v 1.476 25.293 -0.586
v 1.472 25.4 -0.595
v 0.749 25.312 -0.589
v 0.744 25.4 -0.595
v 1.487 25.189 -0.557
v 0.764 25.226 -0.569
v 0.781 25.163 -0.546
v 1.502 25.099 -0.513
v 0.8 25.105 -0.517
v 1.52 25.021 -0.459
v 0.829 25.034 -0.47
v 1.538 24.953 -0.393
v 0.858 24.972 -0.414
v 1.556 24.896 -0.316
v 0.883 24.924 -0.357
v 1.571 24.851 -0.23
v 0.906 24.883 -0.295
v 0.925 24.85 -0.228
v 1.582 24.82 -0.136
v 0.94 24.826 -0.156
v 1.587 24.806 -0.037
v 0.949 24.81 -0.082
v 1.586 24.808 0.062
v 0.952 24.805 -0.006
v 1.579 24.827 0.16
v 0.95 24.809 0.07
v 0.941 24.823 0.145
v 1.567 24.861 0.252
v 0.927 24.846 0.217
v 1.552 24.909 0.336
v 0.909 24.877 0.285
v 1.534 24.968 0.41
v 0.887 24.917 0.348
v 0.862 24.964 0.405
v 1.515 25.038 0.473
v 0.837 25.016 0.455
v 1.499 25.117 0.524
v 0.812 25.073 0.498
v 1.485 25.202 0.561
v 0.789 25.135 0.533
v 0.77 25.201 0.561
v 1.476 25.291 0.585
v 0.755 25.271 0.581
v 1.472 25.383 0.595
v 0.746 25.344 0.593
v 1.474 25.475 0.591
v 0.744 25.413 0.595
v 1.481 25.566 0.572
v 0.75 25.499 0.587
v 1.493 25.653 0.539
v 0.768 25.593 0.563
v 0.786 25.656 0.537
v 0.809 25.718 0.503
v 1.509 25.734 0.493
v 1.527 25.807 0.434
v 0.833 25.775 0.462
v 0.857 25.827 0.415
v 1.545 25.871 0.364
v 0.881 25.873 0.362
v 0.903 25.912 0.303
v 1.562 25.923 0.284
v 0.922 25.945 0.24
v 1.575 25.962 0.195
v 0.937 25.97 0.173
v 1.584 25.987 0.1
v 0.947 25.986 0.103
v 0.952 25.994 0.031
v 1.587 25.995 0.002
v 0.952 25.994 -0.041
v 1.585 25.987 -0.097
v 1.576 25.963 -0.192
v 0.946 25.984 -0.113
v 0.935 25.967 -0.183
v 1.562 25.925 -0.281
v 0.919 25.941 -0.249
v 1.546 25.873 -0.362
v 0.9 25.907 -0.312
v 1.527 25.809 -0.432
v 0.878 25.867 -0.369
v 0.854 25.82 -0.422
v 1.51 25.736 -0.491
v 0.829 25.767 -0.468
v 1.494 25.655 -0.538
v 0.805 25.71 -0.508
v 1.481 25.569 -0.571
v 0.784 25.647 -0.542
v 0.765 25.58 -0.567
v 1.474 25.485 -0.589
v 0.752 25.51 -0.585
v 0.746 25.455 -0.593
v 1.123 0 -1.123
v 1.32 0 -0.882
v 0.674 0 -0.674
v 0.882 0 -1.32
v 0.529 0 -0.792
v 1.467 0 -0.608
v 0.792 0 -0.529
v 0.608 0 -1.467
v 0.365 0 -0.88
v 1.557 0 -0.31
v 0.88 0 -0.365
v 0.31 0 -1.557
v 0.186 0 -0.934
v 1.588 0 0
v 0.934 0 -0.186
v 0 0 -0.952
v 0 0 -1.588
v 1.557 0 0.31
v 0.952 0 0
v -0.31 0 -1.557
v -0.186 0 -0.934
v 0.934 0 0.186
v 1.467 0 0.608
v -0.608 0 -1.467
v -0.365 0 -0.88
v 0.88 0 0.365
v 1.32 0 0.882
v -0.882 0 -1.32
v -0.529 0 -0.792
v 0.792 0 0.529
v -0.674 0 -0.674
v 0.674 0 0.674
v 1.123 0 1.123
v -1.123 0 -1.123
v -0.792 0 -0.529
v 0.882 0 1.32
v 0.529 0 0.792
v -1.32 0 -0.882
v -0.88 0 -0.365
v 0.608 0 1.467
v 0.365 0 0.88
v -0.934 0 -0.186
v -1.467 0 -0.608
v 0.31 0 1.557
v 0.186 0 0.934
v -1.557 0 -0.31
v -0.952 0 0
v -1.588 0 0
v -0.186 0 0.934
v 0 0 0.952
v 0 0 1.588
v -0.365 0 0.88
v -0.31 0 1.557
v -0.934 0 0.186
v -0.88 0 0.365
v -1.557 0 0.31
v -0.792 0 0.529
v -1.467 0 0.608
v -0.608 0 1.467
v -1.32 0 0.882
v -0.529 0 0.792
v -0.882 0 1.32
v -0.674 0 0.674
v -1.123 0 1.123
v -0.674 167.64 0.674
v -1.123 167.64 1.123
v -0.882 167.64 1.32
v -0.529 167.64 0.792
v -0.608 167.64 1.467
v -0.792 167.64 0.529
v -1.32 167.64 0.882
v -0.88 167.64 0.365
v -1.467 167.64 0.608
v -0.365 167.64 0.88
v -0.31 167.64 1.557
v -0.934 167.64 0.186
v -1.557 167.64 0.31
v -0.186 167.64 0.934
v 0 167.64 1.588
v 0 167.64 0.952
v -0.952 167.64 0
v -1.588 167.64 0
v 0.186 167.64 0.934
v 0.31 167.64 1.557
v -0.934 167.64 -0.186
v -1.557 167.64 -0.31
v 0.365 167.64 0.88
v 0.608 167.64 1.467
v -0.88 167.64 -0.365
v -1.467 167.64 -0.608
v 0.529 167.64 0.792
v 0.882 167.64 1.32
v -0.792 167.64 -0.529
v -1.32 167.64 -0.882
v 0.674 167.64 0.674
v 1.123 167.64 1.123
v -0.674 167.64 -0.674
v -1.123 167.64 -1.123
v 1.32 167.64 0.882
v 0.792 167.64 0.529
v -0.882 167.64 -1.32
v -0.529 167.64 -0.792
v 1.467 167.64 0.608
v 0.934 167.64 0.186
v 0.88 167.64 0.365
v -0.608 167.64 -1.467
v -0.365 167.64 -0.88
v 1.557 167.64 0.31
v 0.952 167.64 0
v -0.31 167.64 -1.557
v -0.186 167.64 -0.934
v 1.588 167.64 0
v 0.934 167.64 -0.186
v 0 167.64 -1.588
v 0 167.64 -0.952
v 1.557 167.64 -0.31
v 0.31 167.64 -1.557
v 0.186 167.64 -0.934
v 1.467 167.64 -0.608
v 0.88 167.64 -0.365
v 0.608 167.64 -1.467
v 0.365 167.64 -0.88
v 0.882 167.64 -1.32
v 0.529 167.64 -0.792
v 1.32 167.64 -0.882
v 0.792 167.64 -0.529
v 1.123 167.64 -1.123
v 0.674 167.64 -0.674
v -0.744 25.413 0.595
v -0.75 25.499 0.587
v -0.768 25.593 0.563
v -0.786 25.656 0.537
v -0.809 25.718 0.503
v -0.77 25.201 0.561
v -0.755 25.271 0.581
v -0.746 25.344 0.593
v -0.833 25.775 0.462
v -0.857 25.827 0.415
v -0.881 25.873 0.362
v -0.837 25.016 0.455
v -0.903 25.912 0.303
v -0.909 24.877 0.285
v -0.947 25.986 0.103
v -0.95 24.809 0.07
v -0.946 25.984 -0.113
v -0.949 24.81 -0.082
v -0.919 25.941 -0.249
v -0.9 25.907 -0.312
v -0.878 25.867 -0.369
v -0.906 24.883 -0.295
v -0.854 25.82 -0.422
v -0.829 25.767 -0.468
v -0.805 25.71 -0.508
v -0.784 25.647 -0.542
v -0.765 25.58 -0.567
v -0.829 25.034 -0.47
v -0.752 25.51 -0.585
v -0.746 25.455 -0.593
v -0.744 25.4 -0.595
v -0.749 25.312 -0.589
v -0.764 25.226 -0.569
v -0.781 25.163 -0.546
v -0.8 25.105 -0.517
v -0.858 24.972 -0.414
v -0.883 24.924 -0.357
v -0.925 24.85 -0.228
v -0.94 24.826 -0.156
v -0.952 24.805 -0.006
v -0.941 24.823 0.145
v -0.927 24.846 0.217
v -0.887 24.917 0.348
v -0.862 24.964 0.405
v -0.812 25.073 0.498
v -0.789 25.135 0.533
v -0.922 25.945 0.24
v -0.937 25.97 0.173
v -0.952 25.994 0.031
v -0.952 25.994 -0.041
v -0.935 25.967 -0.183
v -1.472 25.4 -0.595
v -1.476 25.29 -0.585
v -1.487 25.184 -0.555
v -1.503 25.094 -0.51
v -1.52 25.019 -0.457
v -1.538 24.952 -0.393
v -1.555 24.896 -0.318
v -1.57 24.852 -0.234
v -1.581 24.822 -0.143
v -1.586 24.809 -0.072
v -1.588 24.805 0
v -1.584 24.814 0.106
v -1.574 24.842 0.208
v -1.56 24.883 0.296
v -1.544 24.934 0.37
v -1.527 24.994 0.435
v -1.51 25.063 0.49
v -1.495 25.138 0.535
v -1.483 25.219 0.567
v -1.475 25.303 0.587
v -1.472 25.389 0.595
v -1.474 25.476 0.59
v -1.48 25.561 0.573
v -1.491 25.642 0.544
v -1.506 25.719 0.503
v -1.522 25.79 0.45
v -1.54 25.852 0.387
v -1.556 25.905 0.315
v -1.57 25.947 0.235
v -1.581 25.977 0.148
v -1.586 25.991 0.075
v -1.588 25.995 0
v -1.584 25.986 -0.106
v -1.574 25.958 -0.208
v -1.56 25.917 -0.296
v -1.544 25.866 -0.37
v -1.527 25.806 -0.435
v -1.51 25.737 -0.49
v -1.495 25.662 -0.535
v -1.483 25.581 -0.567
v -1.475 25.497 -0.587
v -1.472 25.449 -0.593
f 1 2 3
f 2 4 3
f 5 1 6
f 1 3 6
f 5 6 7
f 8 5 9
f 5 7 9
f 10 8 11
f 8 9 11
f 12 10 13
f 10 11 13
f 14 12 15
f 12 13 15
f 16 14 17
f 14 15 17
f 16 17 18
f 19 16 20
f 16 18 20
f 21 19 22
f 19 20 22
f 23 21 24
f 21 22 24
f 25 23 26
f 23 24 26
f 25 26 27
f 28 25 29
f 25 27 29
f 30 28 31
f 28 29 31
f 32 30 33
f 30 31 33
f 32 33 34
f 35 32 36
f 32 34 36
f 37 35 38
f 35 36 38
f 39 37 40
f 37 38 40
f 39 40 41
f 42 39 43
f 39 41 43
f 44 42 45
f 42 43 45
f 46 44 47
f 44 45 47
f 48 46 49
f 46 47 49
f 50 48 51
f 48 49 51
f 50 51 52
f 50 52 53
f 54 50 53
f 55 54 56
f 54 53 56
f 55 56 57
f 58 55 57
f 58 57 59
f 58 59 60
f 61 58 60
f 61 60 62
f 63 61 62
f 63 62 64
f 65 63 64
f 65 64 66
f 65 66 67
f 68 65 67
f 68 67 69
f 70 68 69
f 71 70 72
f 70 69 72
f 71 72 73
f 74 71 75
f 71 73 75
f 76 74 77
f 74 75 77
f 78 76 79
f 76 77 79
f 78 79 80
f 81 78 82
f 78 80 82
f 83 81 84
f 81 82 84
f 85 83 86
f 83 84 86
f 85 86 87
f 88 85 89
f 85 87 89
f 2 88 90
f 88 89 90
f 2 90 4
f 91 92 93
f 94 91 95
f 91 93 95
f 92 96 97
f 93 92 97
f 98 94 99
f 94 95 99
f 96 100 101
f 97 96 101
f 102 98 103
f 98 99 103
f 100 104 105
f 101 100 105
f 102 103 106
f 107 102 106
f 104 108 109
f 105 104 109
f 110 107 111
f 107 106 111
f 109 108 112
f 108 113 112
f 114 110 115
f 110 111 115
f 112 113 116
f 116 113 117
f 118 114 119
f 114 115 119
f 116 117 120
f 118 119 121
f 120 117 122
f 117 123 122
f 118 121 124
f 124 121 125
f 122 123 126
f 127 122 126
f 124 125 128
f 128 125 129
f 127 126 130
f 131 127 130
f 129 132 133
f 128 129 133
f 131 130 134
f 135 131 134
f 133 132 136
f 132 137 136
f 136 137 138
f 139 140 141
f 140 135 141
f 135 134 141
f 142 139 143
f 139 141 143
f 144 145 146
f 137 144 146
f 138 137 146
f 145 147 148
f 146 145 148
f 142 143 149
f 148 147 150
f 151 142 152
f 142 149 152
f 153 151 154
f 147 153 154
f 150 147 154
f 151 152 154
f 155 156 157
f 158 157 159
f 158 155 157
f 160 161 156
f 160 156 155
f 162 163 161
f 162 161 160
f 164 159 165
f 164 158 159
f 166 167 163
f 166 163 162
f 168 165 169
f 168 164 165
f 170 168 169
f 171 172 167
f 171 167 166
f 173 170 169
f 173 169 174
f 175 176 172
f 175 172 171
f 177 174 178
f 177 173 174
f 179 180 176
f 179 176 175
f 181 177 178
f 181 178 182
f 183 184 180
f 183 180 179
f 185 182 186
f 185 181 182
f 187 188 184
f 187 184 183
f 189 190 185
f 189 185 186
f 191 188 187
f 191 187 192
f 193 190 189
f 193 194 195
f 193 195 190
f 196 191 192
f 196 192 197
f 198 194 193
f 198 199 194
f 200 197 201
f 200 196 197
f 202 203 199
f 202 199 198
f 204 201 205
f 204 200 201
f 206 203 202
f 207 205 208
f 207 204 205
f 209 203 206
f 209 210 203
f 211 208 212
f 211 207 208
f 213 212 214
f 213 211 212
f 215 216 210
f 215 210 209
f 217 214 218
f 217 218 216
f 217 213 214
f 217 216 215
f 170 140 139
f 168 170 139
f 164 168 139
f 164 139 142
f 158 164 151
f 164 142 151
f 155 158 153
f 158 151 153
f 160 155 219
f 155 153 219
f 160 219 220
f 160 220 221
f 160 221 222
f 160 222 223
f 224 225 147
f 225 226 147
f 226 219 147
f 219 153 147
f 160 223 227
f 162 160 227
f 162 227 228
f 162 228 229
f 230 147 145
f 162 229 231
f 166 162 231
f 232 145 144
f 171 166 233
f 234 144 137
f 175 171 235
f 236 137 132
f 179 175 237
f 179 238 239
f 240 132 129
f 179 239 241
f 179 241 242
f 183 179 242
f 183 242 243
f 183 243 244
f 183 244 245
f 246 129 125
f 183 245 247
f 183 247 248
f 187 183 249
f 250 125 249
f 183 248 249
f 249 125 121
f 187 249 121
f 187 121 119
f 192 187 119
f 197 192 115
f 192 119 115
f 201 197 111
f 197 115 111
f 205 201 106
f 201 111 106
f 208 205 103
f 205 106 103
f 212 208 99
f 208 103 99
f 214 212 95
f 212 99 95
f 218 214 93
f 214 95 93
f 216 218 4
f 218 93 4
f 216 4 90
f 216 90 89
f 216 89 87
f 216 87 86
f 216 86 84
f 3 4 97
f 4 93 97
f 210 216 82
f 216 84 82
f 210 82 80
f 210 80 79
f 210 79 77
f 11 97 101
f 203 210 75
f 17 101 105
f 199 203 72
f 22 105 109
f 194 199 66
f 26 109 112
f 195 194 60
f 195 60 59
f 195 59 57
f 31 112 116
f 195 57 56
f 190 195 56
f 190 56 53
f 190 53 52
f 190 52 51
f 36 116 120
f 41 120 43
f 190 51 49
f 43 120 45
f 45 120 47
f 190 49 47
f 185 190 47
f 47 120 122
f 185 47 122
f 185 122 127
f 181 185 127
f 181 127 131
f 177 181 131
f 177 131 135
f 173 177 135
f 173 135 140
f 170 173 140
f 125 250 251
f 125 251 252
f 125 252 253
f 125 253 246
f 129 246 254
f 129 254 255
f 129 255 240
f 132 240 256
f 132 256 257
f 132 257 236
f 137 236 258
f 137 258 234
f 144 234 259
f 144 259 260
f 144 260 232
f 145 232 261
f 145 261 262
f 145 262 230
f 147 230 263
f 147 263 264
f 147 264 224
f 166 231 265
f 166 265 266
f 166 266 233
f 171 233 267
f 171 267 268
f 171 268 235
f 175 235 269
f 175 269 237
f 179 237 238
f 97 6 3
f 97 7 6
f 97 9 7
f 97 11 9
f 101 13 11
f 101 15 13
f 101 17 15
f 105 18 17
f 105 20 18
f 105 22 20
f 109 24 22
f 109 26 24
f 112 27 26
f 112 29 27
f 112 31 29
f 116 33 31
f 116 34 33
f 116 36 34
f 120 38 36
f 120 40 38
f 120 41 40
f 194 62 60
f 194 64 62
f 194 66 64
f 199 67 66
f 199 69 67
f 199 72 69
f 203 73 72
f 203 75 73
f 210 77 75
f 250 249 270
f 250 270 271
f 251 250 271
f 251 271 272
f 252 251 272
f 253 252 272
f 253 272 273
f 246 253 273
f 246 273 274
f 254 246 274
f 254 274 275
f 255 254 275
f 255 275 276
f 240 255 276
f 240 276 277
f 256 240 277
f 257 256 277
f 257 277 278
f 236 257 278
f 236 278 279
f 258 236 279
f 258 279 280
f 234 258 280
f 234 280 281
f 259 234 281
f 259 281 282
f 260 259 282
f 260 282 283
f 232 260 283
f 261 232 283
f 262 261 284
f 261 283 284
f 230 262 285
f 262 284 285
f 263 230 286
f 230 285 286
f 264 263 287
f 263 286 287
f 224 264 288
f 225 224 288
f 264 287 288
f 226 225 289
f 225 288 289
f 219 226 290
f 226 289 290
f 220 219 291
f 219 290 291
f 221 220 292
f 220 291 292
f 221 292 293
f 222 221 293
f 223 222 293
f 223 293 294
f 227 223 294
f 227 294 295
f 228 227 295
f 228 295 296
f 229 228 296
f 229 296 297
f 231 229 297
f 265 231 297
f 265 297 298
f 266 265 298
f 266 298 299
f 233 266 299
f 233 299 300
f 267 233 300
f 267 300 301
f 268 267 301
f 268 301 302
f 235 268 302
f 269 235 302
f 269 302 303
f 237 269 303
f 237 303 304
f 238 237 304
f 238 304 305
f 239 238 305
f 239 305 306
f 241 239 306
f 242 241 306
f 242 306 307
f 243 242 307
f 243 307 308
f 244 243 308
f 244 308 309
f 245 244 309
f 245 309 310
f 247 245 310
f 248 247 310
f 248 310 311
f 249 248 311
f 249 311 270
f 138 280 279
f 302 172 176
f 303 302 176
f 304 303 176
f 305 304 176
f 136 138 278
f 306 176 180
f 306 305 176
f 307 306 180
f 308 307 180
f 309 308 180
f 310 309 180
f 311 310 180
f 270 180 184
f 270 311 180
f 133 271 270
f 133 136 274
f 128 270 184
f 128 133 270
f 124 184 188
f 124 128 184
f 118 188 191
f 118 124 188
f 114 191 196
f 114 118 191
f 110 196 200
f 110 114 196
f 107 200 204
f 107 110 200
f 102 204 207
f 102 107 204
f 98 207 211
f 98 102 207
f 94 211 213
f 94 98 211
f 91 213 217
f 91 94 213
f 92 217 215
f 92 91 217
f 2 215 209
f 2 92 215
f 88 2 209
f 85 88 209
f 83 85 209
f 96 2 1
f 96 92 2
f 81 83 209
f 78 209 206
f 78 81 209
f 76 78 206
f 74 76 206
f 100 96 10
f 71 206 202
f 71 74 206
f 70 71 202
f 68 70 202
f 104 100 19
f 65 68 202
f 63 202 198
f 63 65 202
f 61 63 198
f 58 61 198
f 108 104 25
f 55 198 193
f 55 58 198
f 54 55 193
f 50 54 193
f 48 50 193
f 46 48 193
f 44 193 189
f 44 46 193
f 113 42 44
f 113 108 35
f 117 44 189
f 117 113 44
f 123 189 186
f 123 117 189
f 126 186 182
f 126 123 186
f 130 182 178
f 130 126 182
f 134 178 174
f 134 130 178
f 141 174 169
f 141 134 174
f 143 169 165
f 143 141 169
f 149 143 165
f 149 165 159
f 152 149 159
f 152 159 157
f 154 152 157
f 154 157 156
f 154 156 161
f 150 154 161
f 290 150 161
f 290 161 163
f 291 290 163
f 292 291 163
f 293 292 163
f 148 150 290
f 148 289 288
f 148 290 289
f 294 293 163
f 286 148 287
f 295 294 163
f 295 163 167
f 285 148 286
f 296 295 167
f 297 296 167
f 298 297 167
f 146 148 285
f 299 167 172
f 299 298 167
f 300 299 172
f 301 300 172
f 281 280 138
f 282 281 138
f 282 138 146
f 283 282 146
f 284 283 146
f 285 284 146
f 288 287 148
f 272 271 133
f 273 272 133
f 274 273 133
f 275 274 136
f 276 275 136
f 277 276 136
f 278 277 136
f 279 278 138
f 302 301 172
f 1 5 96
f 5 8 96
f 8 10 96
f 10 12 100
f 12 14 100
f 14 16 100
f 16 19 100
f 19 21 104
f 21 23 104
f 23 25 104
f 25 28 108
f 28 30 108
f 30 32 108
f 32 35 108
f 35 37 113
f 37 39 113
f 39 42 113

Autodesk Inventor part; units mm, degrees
ref_plane "YZ Plane" through (0, 0, 0) normal (1, 0, 0) x (0, 1, 0)
ref_plane "XZ Plane" through (0, 0, 0) normal (0, 1, 0) x (-1, 0, 0)
ref_plane "XY Plane" through (0, 0, 0) normal (0, 0, 1) x (1, 0, 0)
sketch "Sketch1" plane through (0, 0, 0) normal (0, 1, 0) x (-1, 0, 0)
  circle A0 centre (0, 0) radius 1.5875
  dimension "d0" = 3.175
extrude "Extrusion1" add sketch "Sketch1" along normal blind 254
sketch "Sketch9" plane through (0, 0, 0) normal (1, 0, 0) x (0, 1, 0)
  line L0 (0, -1.5875) -> (0, 1.5875)
  line L1 (254, -1.5875) -> (254, 1.5875)
  line L2 (254, 0) -> (228.6, 0)
  line L3 (0, 0) -> (25.4, 0)
  dimension "d42" = 25.4
  dimension "d43" = 25.4
hole "Hole5" at (0, 25.4, 0) direction (-1, 0, 0) diameter 1.1906 end through all both
hole "Hole6" [suppressed]
sketch "Sketch10" plane through (0, 254, 0) normal (0, 1, 0) x (1, 0, 0)
  circle A0 centre (0, 0) radius 1.5875
hole "Hole7" at (0, 254, 0) direction (0, -1, 0) diameter 1.905 end through all
thread "Thread28"
thread "Thread29"
thread "Thread30"
thread "Thread31"
thread "Thread32"
thread "Thread33"
thread "Thread34"
thread "Thread35"
thread "Thread36"
thread "Thread37"
thread "Thread38"
thread "Thread40"
thread "Thread41"
thread "Thread42"
thread "Thread43"
thread "Thread44"
thread "Thread45"
thread "Thread46"
sketch "Sketch15" plane through (0, 254, 0) normal (0, 1, 0) x (1, 0, 0)
  circle A0 centre (0, 0) radius 1.5875
  circle A1 centre (0, 0) radius 0.9525
extrude "Extrusion4" cut sketch "Sketch15" against normal blind 86.36
properties part number "burder_rod_2"
